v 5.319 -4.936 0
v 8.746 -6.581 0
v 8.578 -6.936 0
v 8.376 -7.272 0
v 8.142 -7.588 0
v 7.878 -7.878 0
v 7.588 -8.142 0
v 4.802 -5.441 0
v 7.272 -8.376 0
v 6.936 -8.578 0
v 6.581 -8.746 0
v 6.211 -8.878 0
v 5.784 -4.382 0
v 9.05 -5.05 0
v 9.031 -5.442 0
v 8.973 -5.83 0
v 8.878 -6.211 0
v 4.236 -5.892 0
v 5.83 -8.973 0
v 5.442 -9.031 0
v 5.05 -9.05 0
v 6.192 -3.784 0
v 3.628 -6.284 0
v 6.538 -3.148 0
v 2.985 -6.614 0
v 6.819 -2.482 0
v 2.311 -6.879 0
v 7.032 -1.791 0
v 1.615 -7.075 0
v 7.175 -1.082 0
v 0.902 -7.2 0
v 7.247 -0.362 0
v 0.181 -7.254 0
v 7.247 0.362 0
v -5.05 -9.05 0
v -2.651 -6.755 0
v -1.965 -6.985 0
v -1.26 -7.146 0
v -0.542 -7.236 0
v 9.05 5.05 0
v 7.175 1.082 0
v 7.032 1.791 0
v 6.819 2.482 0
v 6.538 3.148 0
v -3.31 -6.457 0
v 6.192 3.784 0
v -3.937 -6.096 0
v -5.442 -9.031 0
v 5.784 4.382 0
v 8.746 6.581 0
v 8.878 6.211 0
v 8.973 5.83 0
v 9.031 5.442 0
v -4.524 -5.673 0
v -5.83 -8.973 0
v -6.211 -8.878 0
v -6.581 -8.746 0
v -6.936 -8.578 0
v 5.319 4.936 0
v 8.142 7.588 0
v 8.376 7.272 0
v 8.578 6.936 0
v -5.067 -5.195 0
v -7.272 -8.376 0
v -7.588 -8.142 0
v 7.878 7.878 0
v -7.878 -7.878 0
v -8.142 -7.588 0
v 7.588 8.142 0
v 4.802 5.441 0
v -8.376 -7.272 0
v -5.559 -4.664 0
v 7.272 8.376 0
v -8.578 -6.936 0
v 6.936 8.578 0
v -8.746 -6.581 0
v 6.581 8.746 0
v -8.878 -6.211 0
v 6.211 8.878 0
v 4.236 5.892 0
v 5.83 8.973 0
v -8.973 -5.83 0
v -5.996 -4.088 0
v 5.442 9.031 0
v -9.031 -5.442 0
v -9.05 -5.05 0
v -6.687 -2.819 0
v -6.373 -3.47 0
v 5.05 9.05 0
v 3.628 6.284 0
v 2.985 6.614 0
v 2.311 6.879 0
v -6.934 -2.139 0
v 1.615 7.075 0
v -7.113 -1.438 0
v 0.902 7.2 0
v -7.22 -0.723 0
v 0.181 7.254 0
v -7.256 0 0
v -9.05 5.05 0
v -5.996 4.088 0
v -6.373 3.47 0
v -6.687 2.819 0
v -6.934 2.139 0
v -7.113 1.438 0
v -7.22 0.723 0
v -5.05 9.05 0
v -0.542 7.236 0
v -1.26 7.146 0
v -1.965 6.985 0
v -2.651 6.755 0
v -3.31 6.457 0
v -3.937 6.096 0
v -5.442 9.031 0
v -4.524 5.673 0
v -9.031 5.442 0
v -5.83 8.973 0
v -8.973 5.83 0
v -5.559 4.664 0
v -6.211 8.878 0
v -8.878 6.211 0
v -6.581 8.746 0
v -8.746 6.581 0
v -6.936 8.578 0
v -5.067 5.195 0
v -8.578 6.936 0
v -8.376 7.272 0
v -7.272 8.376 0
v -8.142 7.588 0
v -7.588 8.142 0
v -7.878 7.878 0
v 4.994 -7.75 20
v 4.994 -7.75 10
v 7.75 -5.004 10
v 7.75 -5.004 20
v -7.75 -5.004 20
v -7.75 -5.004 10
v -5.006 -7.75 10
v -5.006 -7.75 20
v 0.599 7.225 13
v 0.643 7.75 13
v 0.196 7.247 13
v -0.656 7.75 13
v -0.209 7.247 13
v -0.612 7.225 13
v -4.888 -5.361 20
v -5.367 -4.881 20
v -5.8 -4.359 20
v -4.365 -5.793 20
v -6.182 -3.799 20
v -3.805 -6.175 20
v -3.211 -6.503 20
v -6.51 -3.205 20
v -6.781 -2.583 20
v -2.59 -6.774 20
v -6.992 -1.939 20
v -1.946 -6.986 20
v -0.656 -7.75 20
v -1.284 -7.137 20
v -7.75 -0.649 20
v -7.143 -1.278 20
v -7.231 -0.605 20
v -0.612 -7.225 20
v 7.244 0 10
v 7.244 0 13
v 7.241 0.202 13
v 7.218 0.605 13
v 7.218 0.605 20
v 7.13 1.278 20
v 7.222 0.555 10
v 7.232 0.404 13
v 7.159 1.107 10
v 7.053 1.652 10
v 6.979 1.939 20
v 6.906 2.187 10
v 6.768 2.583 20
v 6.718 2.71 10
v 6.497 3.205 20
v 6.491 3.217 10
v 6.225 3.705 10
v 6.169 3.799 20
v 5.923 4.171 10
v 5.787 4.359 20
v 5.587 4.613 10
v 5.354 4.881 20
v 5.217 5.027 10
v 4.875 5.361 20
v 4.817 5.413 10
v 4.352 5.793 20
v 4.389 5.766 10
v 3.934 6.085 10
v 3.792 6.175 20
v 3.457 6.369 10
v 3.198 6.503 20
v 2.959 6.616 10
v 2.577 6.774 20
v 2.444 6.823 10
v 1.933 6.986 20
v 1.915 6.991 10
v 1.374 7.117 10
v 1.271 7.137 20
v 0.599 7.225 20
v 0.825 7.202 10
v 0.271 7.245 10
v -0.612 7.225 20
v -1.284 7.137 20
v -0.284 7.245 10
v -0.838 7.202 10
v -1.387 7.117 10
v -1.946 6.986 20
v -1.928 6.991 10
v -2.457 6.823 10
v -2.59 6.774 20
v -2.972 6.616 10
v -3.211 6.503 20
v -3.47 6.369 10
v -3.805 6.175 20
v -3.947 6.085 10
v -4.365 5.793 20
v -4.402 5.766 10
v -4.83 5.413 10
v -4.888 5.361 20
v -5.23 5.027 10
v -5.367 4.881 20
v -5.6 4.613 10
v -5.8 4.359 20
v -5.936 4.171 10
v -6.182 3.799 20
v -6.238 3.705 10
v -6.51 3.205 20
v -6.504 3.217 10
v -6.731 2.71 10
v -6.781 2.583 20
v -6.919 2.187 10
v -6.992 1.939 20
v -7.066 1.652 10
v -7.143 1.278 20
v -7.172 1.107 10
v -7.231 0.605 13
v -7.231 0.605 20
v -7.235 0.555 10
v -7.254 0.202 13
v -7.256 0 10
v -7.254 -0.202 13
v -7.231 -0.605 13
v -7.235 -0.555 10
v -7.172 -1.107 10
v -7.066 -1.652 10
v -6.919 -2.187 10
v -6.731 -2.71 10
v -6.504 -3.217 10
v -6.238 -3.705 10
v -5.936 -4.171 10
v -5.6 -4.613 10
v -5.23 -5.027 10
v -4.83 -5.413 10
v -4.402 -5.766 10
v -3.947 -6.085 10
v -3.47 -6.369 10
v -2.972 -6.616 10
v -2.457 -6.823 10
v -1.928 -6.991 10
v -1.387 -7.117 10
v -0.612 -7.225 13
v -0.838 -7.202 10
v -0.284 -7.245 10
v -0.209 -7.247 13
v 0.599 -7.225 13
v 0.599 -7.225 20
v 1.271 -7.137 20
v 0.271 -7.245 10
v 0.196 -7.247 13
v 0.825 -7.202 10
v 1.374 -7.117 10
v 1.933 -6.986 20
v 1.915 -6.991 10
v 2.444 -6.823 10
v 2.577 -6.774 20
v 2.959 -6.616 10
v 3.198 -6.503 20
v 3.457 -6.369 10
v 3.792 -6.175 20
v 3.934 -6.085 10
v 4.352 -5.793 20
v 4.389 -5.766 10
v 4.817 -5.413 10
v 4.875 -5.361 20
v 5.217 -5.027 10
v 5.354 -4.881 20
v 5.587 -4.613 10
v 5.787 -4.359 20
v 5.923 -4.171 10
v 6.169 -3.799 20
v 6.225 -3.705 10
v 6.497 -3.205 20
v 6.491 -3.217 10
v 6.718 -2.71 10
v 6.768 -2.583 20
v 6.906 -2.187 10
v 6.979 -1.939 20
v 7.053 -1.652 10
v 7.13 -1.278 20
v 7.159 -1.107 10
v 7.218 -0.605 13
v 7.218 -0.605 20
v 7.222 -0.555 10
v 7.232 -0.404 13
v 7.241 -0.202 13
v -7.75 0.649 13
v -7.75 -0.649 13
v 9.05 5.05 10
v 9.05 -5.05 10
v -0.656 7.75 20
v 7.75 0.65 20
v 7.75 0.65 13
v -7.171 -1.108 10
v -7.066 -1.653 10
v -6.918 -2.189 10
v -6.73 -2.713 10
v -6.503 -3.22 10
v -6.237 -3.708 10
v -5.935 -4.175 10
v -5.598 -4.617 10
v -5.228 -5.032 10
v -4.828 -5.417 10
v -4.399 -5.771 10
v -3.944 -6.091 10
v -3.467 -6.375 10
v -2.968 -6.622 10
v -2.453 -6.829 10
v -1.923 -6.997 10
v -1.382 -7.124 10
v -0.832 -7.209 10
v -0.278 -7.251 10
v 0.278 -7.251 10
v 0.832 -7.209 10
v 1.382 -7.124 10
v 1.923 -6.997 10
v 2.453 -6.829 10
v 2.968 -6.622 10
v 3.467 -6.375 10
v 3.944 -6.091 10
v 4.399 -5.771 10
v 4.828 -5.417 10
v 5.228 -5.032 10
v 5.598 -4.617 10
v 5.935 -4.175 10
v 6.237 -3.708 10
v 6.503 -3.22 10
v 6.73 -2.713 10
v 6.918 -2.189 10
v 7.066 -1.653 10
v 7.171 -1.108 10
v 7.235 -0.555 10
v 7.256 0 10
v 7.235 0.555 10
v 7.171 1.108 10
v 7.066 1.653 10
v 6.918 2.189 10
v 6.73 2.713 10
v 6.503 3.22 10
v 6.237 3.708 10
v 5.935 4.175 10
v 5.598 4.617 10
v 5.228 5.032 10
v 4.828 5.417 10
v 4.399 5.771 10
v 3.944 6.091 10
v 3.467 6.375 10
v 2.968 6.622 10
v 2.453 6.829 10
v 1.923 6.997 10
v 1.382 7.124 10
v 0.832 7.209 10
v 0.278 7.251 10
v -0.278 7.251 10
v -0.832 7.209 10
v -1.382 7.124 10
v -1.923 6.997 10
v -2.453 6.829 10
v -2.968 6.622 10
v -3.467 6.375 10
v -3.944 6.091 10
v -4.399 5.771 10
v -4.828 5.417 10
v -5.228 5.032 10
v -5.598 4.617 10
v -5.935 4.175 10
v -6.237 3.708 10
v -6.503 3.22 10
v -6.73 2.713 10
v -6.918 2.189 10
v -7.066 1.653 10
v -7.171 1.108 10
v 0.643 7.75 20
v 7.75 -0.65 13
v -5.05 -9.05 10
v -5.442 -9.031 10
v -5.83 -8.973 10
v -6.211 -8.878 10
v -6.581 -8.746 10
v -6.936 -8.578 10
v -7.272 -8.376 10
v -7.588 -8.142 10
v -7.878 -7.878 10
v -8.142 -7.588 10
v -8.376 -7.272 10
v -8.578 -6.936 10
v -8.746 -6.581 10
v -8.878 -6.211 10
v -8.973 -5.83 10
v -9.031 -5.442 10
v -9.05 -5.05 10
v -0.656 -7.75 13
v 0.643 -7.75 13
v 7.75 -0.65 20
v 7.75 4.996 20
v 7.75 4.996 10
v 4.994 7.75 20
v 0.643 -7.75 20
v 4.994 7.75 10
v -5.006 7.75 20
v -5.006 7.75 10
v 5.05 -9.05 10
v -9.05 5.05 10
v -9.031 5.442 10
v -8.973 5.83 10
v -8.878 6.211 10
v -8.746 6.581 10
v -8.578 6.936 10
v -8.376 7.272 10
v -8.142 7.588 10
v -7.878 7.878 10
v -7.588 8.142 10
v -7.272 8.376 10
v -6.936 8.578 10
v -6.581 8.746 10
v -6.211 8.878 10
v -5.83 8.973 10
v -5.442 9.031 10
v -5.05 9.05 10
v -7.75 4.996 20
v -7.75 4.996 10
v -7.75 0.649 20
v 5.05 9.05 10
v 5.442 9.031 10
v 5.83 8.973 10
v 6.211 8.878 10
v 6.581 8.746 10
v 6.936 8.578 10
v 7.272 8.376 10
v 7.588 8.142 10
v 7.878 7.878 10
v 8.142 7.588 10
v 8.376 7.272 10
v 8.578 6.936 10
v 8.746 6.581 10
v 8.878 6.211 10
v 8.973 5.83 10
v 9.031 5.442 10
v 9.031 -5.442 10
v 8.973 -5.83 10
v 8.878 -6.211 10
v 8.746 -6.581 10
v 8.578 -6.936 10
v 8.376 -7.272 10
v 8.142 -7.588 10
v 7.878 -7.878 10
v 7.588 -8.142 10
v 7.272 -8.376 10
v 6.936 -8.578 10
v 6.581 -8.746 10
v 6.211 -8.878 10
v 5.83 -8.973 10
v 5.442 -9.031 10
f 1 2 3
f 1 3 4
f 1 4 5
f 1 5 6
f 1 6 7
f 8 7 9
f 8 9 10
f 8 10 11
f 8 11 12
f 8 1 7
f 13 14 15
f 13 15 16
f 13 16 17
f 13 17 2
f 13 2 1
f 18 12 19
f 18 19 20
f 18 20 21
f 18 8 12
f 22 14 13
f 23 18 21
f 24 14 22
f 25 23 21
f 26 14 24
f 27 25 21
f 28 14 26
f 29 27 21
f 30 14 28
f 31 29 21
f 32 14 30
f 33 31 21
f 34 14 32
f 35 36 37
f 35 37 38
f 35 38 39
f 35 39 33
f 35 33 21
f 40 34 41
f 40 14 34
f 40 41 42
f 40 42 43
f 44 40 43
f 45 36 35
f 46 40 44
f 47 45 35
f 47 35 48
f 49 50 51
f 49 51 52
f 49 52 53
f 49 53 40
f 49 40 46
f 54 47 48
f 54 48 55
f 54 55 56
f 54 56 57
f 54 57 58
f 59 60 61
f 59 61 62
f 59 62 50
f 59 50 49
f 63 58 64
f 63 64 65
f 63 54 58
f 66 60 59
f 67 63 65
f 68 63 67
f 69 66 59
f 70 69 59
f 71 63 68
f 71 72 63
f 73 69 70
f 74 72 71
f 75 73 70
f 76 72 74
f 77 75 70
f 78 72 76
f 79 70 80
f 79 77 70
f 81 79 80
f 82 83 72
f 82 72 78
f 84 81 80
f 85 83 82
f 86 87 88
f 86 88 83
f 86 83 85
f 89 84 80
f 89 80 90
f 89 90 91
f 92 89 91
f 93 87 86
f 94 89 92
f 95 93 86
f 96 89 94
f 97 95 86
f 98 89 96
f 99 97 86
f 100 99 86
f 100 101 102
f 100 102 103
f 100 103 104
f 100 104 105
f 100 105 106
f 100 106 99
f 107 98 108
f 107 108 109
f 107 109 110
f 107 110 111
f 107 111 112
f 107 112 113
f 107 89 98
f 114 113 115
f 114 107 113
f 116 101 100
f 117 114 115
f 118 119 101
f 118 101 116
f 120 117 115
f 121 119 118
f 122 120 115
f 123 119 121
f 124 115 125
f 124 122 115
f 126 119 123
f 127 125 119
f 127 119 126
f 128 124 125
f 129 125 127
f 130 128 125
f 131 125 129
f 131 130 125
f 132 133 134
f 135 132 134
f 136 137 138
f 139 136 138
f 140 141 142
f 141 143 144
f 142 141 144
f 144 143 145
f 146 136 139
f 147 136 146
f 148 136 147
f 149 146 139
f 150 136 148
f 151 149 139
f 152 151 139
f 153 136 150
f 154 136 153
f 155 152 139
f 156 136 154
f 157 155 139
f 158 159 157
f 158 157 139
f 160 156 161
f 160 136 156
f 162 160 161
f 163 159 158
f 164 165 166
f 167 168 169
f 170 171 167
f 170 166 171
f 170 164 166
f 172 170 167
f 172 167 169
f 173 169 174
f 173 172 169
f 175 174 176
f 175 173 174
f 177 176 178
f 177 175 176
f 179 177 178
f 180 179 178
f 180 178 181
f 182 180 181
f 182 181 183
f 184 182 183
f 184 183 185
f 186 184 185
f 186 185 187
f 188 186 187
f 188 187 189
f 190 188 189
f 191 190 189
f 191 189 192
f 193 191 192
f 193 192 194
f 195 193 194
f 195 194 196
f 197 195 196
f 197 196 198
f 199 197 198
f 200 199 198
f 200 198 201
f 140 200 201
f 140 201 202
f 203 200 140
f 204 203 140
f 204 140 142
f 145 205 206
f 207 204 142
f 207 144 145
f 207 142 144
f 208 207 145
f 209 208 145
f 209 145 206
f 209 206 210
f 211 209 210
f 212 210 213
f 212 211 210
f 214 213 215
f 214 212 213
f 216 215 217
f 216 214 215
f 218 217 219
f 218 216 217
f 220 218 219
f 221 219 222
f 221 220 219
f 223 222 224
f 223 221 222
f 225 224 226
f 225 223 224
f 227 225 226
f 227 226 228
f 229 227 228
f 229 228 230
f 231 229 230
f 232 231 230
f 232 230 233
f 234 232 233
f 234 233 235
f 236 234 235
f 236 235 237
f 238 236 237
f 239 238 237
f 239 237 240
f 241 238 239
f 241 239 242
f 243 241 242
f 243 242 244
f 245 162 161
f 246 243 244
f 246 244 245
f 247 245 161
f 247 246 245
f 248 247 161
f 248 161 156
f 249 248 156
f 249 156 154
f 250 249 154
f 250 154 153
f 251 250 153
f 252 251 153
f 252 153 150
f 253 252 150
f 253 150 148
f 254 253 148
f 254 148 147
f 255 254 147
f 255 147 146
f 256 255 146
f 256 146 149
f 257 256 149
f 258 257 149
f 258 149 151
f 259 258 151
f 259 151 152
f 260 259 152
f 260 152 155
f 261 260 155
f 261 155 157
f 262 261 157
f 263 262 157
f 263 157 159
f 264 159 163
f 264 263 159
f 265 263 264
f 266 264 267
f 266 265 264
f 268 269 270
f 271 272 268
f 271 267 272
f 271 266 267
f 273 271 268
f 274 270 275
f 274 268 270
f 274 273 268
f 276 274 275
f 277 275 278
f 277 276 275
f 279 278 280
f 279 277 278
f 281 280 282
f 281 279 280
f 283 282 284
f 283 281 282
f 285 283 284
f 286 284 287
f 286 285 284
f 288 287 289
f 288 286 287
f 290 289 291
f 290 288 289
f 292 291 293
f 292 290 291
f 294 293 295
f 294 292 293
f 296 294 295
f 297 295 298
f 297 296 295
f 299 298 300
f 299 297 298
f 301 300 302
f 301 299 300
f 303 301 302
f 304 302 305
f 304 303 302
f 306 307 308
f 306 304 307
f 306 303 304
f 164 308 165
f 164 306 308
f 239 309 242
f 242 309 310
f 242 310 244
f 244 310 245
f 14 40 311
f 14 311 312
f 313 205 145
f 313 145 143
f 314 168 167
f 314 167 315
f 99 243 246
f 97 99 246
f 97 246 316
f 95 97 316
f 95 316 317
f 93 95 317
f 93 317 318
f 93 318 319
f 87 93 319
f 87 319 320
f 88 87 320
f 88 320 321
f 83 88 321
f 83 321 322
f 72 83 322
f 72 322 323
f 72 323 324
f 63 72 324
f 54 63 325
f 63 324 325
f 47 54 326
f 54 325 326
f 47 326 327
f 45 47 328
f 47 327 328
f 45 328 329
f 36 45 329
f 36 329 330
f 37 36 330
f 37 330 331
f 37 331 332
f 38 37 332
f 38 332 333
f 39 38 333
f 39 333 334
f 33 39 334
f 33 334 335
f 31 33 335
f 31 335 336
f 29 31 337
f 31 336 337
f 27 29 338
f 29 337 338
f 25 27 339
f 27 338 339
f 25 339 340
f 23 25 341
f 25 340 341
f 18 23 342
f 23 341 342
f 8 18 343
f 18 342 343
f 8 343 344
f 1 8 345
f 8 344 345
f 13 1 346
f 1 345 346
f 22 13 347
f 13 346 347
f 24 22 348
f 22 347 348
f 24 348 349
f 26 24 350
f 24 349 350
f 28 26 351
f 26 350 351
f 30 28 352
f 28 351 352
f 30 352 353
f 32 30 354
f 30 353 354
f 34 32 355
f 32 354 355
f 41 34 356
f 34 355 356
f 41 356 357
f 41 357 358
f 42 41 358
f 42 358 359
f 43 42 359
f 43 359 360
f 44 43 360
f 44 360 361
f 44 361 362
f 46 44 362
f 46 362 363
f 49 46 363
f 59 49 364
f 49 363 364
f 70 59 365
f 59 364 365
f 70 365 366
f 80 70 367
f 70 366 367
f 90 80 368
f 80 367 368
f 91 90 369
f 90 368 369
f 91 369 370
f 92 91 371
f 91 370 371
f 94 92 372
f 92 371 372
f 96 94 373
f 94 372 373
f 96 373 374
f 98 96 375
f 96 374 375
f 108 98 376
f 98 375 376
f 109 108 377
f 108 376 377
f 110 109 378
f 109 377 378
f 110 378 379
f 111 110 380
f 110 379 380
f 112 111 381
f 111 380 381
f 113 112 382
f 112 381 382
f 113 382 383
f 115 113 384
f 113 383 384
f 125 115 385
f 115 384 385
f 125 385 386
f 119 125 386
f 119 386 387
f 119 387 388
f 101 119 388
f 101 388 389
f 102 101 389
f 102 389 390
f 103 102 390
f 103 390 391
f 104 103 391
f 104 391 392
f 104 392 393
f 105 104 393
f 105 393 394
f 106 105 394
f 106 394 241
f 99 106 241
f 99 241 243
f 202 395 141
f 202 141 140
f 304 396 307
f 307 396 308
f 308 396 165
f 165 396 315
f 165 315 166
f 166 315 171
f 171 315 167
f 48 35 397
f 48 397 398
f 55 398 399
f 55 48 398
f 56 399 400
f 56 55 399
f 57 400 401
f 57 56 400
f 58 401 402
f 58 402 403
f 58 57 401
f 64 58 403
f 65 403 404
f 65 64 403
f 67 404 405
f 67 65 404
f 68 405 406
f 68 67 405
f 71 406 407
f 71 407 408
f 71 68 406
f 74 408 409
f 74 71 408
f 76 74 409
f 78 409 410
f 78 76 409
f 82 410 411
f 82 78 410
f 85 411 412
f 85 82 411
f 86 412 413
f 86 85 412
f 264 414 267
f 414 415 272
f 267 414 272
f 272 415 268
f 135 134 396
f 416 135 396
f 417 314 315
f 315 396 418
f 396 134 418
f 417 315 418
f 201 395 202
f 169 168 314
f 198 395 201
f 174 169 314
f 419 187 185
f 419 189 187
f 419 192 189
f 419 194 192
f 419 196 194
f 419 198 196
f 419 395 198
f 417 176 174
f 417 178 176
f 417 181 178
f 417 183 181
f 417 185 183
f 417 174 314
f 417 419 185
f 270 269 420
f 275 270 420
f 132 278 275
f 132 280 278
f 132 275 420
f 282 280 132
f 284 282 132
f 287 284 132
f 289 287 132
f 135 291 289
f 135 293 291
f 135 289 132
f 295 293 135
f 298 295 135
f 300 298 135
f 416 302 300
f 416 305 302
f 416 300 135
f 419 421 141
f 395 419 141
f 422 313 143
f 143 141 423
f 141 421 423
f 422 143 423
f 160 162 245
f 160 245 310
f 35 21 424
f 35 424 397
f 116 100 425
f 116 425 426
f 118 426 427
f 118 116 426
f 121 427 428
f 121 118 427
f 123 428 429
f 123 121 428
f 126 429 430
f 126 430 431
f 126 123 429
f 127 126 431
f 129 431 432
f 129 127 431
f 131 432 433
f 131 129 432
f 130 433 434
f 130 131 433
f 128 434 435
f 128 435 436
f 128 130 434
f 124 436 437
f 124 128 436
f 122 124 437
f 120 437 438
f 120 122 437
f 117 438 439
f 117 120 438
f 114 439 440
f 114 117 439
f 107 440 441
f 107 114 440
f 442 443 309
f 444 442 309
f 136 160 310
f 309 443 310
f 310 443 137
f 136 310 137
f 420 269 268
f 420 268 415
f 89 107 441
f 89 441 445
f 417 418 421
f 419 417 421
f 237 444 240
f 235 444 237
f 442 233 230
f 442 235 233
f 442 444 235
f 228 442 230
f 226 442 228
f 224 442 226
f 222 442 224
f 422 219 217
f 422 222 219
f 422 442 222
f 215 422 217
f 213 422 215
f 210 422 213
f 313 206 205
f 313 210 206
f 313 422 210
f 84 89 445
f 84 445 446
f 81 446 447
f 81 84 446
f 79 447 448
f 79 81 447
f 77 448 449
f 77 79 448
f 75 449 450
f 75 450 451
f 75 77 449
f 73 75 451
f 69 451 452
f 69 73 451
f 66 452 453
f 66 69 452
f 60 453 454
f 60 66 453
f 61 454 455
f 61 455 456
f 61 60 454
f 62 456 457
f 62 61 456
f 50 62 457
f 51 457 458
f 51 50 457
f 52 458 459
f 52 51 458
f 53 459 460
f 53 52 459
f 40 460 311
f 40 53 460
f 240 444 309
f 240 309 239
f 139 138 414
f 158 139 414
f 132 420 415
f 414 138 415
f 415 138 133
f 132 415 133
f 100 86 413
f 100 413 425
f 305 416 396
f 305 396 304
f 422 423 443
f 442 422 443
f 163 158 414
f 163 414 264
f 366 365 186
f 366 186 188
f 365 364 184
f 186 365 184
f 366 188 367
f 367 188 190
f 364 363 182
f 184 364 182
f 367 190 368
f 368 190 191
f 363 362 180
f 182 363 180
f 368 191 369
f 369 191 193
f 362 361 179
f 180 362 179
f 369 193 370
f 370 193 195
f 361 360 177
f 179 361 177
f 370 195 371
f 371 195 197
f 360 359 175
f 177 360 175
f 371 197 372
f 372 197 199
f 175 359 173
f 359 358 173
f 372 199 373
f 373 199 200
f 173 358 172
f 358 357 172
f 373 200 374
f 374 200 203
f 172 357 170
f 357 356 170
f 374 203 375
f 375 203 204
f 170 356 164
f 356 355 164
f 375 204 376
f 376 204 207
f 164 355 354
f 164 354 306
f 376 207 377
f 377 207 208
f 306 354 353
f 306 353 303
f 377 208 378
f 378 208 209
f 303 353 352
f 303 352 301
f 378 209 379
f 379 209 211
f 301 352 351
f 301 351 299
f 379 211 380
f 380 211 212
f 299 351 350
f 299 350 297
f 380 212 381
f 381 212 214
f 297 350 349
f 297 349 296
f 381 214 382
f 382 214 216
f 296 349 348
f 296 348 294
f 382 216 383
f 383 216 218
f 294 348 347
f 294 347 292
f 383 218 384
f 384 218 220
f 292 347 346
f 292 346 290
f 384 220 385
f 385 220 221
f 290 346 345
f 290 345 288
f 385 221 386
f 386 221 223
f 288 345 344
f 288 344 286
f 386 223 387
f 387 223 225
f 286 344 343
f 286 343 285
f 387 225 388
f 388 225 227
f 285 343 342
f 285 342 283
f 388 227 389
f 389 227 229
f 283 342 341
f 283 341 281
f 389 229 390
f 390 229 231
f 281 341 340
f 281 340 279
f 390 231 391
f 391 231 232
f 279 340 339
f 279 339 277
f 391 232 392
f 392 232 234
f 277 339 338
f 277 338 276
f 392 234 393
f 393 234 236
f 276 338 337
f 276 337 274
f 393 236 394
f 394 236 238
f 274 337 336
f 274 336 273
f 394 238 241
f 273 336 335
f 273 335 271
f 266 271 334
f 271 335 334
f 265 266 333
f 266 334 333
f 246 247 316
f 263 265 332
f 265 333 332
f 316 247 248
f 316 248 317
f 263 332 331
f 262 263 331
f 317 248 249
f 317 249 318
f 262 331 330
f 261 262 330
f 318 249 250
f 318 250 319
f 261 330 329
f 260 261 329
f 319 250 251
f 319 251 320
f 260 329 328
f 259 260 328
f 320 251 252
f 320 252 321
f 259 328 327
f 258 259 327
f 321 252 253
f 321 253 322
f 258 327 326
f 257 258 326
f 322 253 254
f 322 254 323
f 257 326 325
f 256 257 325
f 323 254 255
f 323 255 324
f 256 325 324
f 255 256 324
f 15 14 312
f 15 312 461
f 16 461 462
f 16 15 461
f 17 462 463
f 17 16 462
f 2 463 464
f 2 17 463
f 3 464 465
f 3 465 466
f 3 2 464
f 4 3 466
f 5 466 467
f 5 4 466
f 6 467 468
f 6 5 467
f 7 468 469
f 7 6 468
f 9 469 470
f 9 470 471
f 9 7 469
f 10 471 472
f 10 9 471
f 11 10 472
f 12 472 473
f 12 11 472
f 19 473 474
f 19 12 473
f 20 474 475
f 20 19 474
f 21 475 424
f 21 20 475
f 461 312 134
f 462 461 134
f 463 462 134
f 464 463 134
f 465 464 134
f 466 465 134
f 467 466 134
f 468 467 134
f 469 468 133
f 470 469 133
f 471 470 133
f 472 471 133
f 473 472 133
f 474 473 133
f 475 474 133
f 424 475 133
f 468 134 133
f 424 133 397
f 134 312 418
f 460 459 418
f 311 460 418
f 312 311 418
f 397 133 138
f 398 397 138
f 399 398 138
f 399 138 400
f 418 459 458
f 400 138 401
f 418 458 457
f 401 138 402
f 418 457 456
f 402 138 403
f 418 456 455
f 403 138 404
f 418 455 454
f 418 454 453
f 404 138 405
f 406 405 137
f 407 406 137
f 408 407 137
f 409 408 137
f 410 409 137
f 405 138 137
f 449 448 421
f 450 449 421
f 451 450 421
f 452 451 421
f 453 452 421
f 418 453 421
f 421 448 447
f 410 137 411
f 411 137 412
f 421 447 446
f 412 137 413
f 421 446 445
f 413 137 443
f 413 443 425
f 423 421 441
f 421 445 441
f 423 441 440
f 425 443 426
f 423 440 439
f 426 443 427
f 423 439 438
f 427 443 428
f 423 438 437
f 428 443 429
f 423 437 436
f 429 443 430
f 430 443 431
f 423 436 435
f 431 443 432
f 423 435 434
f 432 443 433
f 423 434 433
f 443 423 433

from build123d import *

# Parameters (mm, degrees)
BOSS_EXTRUDE1_DEPTH = 10
SKETCH22_R          = 7.25
BOSS_EXTRUDE4_DEPTH = 10
SKETCH24_R          = 7.256494522
CUT_EXTRUDE15_DEPTH = 35
CUT_EXTRUDE16_DEPTH = 7
CIRPATTERN1_COUNT   = 4


with BuildPart() as part:
    # Sketch1 → Boss-Extrude1 (new body)
    with BuildSketch(Plane.XY):
        with BuildLine():
            Line((-5.05, 9.05), (5.05, 9.05))
            ThreePointArc((5.05, 9.05), (7.878427125, 7.878427125), (9.05, 5.05))
            Line((9.05, 5.05), (9.05, -5.05))
            ThreePointArc((9.05, -5.05), (7.878427125, -7.878427125), (5.05, -9.05))
            Line((5.05, -9.05), (-5.05, -9.05))
            ThreePointArc((-5.05, -9.05), (-7.878427125, -7.878427125), (-9.05, -5.05))
            Line((-9.05, -5.05), (-9.05, 5.05))
            ThreePointArc((-9.05, 5.05), (-7.878427125, 7.878427125), (-5.05, 9.05))
        make_face()
    extrude(amount=BOSS_EXTRUDE1_DEPTH)

    # Sketch22 → Boss-Extrude4 (add)
    with BuildSketch(Plane.XY.offset(10)):
        Polygon((-5.006494522, -7.75), (4.993505478, -7.75), (7.75, -5.003911735), (7.75, 4.996088265), (4.993505478, 7.75), (-5.006494522, 7.75), (-7.75, 4.996088265), (-7.75, -5.003911735), align=None)
        with Locations((-0.006494522, 0)):
            Circle(SKETCH22_R, mode=Mode.SUBTRACT)
    extrude(amount=BOSS_EXTRUDE4_DEPTH)

    # Sketch24 → Cut-Extrude15 (cut)
    with BuildSketch(Plane.XY.offset(10)):
        with Locations(Location((0, 0, 0), (0, 0, 180))):
            Circle(SKETCH24_R)
    extrude(amount=-CUT_EXTRUDE15_DEPTH, mode=Mode.SUBTRACT)

    # Sketch25 → Cut-Extrude16 (cut)
    with BuildSketch(Plane.XY.offset(20)):
        Polygon((0, 0), (7.75, 0.65), (7.75, -0.65), align=None)
    cut_extrude16 = extrude(amount=-CUT_EXTRUDE16_DEPTH, mode=Mode.SUBTRACT)

    # CirPattern1: Cut-Extrude16 ×4 about axis
    cirpattern1_axis = Axis((-0.006494522, 0, 20), (0, 0, -1))
    for i in range(1, CIRPATTERN1_COUNT):
        add(cut_extrude16.rotate(cirpattern1_axis, i * 360 / CIRPATTERN1_COUNT), mode=Mode.SUBTRACT)


solid = part.part
